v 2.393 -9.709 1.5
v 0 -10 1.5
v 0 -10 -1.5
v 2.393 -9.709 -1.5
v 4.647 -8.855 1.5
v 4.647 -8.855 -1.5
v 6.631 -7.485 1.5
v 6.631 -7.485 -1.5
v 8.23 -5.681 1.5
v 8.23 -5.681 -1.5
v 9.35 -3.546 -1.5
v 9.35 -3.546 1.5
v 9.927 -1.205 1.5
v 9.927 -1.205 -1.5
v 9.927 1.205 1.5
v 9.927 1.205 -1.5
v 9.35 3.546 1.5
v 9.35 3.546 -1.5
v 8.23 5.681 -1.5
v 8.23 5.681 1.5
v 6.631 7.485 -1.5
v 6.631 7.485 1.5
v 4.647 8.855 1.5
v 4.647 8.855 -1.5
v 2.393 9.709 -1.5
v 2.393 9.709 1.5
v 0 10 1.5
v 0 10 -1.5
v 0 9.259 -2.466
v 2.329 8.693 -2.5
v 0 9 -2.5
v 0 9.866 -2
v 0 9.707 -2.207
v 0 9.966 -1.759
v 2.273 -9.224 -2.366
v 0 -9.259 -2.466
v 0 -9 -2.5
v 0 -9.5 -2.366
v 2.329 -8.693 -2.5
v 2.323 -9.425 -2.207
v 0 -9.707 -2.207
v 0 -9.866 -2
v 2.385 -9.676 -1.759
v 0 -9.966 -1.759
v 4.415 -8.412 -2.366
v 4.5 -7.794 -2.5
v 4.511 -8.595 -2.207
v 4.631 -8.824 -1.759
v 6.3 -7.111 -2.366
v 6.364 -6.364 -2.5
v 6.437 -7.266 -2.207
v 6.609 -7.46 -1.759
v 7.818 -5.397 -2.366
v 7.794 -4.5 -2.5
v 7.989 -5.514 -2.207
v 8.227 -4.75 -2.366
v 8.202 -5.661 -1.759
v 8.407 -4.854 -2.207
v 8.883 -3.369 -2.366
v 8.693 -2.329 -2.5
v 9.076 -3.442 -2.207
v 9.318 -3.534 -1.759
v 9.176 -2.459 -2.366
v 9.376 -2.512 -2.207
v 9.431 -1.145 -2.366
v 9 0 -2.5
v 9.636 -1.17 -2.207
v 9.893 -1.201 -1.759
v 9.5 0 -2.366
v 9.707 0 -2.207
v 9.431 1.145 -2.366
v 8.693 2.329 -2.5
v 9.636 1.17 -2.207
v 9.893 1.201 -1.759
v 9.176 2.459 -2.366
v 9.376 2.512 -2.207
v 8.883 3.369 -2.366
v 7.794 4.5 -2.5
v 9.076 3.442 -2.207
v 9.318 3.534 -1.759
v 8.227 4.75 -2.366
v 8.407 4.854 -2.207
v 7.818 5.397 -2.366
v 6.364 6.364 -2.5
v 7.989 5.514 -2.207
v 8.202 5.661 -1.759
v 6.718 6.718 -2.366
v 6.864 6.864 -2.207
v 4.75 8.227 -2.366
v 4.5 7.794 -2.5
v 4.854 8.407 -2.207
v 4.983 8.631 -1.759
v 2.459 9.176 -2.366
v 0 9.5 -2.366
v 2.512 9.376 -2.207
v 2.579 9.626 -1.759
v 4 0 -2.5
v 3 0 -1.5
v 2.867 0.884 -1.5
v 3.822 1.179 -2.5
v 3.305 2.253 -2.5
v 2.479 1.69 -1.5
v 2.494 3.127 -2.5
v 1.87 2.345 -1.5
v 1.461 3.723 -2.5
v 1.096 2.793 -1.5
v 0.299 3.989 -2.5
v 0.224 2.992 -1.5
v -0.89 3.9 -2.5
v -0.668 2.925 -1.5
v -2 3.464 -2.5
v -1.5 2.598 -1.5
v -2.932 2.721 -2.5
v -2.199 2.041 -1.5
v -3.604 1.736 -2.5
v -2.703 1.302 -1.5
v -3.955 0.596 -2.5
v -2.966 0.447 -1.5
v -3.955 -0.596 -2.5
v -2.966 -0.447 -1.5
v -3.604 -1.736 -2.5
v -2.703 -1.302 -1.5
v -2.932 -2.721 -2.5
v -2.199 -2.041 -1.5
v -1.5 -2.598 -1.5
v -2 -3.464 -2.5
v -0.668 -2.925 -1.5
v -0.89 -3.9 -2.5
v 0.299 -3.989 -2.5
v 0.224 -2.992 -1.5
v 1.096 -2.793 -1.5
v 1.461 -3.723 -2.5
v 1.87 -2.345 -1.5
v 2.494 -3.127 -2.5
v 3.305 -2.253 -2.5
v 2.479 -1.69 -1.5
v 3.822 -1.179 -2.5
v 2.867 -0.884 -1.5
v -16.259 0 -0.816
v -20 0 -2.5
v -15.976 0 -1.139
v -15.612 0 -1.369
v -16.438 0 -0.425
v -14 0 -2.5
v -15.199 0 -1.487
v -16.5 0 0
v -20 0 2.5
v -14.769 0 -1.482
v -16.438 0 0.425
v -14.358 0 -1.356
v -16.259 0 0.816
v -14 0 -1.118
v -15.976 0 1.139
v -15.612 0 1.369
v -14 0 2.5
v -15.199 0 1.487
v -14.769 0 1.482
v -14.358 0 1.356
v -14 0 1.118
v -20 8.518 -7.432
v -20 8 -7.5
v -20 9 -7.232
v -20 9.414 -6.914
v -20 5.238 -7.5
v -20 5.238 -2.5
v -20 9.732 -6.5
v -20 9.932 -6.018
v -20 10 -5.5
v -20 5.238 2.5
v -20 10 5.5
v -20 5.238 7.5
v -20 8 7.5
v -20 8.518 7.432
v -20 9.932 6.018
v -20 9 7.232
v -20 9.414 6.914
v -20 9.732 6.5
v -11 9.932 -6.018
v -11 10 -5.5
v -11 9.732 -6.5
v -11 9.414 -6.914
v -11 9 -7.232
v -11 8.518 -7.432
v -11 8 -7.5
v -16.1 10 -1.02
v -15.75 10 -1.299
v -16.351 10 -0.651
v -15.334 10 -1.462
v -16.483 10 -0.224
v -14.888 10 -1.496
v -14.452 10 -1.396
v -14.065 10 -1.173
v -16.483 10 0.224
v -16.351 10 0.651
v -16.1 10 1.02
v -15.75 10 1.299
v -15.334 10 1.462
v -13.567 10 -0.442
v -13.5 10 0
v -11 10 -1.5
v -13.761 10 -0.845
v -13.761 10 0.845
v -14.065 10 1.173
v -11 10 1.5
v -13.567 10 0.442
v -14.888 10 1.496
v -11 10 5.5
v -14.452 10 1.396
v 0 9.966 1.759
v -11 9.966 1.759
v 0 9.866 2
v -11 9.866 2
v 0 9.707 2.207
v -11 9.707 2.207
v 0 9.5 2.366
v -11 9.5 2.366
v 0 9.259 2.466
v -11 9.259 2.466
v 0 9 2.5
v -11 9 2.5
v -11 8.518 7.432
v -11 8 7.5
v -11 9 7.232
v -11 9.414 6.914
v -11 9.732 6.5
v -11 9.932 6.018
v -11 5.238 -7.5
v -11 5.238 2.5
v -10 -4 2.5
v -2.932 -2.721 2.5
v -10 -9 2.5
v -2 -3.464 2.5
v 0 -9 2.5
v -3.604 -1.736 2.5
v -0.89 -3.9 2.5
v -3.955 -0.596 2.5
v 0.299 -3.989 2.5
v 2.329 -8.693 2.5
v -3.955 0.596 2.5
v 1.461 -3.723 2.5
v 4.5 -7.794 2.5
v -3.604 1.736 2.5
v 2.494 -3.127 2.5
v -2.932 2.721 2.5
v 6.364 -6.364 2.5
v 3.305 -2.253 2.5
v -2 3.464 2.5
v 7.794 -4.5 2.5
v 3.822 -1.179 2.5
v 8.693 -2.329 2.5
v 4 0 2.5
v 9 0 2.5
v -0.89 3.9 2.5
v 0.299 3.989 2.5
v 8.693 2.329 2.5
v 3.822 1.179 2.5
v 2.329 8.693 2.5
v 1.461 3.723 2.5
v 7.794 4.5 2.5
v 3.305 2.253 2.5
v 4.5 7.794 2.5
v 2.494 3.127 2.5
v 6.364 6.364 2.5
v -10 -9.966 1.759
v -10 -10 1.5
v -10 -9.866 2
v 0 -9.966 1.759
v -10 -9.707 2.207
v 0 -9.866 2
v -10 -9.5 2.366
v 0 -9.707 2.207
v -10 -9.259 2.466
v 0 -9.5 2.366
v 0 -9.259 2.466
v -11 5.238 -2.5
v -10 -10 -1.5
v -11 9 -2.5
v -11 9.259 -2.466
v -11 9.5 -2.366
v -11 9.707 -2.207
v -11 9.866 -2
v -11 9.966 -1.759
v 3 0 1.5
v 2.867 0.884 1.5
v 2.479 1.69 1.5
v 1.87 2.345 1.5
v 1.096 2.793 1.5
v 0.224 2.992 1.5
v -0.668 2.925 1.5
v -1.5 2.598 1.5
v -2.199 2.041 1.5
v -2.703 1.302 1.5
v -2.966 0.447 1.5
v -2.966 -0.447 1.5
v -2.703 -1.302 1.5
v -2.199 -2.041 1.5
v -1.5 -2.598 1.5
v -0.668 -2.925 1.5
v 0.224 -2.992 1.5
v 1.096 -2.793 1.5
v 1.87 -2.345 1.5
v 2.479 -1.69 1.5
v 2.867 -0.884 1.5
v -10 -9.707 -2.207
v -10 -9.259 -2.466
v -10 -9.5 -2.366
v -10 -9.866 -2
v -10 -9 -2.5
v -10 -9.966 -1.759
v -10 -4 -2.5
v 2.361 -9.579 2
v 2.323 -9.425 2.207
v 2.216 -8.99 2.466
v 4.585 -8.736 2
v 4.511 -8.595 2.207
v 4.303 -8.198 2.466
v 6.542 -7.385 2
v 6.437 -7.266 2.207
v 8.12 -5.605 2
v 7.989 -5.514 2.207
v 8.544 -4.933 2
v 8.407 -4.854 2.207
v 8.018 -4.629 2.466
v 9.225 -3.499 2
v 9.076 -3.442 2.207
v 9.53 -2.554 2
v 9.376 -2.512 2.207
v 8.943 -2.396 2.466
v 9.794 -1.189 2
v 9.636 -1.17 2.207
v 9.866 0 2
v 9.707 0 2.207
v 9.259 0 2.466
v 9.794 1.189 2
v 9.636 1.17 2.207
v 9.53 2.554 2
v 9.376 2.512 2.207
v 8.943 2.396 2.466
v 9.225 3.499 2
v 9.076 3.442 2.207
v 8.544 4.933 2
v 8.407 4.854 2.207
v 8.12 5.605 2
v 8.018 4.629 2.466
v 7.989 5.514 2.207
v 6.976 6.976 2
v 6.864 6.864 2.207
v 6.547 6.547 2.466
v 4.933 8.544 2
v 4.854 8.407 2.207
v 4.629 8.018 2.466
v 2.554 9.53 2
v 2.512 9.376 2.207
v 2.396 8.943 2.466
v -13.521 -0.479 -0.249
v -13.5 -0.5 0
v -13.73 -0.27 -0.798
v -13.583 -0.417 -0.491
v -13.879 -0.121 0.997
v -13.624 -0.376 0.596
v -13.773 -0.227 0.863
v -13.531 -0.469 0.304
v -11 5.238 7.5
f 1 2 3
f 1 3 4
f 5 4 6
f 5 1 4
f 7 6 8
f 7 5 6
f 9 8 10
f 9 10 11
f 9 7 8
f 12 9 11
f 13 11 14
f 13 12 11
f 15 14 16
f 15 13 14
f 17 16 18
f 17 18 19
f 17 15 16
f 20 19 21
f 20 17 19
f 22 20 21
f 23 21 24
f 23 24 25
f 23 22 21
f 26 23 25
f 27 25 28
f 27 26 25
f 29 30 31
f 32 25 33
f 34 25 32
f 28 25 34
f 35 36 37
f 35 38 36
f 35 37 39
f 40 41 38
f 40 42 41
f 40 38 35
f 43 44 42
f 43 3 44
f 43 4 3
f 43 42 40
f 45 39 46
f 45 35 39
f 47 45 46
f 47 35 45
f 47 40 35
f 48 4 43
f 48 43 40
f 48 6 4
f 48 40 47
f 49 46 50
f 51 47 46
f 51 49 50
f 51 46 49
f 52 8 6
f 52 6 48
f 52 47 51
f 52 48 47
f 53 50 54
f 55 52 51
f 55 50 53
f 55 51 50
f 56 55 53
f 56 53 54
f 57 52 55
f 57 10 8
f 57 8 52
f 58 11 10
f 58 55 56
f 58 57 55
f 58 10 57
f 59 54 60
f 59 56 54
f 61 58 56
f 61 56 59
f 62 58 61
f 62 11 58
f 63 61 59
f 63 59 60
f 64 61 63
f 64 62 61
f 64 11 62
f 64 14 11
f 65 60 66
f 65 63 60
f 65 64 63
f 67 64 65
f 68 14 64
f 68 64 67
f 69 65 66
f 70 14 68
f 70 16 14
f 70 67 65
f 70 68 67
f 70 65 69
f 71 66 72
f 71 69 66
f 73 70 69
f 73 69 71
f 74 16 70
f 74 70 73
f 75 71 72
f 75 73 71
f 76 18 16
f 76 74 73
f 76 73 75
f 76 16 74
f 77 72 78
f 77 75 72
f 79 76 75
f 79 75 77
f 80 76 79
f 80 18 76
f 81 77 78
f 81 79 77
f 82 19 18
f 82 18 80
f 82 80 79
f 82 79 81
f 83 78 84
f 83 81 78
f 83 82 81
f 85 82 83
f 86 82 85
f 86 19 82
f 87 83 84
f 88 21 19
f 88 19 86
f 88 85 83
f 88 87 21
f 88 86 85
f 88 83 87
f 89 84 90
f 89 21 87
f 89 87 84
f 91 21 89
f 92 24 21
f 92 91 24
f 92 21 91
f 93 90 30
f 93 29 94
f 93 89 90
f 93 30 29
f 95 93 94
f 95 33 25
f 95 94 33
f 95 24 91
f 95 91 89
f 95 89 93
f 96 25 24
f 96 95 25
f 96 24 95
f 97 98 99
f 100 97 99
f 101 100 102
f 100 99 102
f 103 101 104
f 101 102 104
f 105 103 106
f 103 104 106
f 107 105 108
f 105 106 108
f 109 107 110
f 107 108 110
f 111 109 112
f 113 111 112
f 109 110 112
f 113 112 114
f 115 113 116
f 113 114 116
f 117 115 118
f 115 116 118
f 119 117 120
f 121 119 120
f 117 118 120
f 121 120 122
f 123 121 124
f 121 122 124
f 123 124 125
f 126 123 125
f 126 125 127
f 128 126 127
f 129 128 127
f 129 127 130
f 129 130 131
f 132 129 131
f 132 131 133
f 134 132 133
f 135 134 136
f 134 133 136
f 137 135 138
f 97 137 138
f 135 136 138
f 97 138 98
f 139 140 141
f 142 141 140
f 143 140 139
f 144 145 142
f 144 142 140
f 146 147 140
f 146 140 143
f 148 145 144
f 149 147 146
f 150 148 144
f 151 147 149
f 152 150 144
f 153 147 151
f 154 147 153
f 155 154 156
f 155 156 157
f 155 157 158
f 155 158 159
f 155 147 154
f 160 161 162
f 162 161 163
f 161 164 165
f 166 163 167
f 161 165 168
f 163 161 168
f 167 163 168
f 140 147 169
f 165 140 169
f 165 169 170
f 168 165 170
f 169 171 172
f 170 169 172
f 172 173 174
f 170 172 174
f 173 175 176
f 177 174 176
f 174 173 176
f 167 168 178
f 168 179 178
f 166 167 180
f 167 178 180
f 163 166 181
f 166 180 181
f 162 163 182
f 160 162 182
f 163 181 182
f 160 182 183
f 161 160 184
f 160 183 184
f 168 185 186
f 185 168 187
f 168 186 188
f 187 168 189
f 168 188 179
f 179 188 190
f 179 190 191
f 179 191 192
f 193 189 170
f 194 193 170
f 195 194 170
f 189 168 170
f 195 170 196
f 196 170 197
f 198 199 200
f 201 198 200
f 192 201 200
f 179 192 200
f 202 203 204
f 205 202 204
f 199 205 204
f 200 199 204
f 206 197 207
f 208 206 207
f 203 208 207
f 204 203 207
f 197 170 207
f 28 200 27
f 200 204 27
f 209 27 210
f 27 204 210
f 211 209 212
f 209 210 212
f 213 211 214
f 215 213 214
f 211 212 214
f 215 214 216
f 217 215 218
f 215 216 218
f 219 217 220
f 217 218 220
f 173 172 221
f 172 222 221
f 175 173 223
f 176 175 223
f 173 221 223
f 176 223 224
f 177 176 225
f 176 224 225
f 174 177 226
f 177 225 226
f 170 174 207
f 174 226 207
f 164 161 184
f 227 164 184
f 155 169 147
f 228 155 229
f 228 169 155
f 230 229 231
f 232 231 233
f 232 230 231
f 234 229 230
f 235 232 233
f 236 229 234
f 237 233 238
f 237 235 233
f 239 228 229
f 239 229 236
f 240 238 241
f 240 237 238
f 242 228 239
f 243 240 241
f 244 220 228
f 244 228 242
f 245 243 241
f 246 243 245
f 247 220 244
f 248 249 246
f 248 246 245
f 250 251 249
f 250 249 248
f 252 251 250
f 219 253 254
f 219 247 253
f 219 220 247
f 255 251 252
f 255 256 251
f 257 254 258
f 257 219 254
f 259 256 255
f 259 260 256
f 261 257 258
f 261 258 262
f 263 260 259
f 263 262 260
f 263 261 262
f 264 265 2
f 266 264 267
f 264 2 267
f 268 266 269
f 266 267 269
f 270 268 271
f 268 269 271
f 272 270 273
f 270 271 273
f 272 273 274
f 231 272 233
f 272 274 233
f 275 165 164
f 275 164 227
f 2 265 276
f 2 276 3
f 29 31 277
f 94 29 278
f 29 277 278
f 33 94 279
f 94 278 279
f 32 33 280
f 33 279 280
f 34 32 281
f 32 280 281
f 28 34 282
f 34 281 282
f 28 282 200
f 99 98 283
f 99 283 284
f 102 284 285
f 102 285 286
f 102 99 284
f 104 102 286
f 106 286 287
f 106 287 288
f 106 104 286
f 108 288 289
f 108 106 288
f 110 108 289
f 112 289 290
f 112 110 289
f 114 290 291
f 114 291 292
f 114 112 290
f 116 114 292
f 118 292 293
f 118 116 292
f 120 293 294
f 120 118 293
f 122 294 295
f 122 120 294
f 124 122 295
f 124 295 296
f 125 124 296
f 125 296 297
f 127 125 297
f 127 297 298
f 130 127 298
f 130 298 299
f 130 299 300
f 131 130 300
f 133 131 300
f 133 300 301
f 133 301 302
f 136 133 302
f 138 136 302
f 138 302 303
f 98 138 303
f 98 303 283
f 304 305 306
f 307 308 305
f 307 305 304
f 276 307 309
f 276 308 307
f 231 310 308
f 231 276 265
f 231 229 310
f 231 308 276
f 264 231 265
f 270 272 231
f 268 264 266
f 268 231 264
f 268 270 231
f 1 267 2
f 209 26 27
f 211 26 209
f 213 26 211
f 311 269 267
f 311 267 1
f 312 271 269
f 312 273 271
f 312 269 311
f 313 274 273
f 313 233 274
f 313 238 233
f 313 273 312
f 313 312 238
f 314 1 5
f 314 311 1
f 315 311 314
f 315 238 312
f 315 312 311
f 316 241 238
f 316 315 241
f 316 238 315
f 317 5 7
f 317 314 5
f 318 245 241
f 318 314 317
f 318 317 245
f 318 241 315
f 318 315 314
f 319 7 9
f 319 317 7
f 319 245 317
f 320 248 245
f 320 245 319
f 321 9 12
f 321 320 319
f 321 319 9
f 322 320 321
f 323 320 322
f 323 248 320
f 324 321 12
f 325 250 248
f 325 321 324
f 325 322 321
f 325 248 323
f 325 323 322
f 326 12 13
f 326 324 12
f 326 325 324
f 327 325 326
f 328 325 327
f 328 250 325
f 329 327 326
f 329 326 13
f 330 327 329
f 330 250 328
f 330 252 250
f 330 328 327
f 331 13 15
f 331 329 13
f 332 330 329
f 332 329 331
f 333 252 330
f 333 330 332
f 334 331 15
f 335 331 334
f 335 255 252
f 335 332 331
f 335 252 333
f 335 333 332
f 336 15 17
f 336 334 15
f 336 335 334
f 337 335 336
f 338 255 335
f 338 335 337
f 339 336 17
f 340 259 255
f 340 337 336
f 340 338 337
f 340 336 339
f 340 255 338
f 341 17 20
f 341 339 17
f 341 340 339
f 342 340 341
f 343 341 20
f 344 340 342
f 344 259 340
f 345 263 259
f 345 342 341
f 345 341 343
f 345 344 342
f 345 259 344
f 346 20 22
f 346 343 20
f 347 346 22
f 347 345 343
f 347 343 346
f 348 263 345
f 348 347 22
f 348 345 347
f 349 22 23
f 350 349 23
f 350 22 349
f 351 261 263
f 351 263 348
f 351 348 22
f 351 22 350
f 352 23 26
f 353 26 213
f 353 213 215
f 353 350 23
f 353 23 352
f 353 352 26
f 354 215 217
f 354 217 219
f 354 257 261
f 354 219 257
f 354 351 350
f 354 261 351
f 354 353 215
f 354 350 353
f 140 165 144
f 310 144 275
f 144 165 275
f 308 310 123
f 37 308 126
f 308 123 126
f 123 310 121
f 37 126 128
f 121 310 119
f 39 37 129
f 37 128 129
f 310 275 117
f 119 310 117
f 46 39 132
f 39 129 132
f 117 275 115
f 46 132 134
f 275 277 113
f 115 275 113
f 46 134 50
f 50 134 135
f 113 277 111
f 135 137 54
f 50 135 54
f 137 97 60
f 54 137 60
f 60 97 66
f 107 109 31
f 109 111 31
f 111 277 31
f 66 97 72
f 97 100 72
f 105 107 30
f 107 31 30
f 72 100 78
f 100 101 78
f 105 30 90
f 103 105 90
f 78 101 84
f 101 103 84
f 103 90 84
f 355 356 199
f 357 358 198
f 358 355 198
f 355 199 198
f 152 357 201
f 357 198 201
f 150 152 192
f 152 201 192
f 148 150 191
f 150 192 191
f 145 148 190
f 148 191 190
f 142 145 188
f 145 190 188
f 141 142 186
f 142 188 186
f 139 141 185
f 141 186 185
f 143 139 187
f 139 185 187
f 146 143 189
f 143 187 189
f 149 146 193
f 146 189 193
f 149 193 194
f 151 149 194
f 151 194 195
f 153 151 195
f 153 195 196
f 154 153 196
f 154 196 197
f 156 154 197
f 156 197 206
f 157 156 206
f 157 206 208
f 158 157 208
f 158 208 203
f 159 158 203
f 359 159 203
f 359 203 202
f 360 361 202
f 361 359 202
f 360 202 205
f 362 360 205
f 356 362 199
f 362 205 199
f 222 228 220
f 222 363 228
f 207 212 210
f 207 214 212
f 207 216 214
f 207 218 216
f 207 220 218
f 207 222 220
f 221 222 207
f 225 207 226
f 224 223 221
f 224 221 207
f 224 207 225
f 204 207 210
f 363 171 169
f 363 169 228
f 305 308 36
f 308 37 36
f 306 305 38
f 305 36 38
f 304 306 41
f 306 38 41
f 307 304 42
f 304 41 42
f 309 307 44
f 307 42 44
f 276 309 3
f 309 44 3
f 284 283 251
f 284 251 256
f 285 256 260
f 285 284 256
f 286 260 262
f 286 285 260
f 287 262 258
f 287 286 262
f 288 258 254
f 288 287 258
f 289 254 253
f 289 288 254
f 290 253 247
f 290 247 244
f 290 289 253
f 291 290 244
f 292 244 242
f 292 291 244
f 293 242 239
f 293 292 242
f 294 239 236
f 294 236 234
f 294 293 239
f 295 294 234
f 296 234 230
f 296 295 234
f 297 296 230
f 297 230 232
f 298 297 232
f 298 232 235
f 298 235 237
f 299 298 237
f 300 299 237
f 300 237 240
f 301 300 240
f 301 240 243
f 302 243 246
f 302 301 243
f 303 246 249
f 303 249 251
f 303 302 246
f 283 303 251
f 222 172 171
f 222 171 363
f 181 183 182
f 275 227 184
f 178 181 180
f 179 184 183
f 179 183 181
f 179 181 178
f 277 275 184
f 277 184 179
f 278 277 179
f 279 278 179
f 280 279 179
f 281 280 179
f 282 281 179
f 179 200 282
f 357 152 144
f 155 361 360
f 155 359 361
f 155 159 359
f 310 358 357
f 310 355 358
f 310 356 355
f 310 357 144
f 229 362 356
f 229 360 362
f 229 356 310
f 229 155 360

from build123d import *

# Parameters (mm, degrees)
SKETCH1_R           = 3
BOSS_EXTRUDE1_DEPTH = 2.5
SKETCH2_W           = 9
SKETCH2_H           = 4.761904762
BOSS_EXTRUDE2_DEPTH = 7.5
FILLET1_R           = 2
CHAMFER1_SIZE       = 1
FILLET2_R           = 1
SKETCH3_R           = 1.5
CUT_EXTRUDE1_DEPTH  = 20


with BuildPart() as part:
    # Sketch1 → Boss-Extrude1 (new body, symmetric)
    with BuildSketch(Plane.XY):
        with BuildLine():
            Line((0, 10), (-20, 10))
            Line((-20, 10), (-20, 0))
            Line((-20, 0), (-14, 0))
            Line((-14, 0), (-10, -4))
            Line((-10, -4), (-10, -10))
            Line((-10, -10), (0, -10))
            ThreePointArc((0, -10), (10, 0), (0, 10))
        make_face()
        Circle(SKETCH1_R, mode=Mode.SUBTRACT)
    extrude(amount=BOSS_EXTRUDE1_DEPTH, both=True)

    # Sketch2 → Boss-Extrude2 (add, symmetric)
    with BuildSketch(Plane.XY):
        with Locations((-15.5, 7.619047619)):
            Rectangle(SKETCH2_W, SKETCH2_H)
    extrude(amount=BOSS_EXTRUDE2_DEPTH, both=True)

    # Fillet1
    fillet1_edges = [part.edges().sort_by_distance(p)[0] for p in [
        (-15.5, 10, -7.5),
        (-15.5, 10, 7.5),
    ]]
    fillet(fillet1_edges, radius=FILLET1_R)

    # Chamfer1
    chamfer1_edges = [part.edges().sort_by_distance(p)[0] for p in [
        (-3, 0, -2.5),
        (-3, 0, 2.5),
    ]]
    chamfer(chamfer1_edges, length=CHAMFER1_SIZE)

    # Fillet2
    fillet2_edges = [part.edges().sort_by_distance(p)[0] for p in [
        (-5, -10, 2.5),
        (10, 0, 2.5),
        (-5.5, 10, 2.5),
        (-5.5, 10, -2.5),
        (10, 0, -2.5),
        (-5, -10, -2.5),
    ]]
    fillet(fillet2_edges, radius=FILLET2_R)

    # Sketch3 → Cut-Extrude1 (cut)
    with BuildSketch(Plane(origin=(0, 10, 0), x_dir=(1, 0, 0), z_dir=(0, 1, 0))):
        with Locations((-15, 0)):
            Circle(SKETCH3_R)
    extrude(amount=-CUT_EXTRUDE1_DEPTH, mode=Mode.SUBTRACT)


solid = part.part
